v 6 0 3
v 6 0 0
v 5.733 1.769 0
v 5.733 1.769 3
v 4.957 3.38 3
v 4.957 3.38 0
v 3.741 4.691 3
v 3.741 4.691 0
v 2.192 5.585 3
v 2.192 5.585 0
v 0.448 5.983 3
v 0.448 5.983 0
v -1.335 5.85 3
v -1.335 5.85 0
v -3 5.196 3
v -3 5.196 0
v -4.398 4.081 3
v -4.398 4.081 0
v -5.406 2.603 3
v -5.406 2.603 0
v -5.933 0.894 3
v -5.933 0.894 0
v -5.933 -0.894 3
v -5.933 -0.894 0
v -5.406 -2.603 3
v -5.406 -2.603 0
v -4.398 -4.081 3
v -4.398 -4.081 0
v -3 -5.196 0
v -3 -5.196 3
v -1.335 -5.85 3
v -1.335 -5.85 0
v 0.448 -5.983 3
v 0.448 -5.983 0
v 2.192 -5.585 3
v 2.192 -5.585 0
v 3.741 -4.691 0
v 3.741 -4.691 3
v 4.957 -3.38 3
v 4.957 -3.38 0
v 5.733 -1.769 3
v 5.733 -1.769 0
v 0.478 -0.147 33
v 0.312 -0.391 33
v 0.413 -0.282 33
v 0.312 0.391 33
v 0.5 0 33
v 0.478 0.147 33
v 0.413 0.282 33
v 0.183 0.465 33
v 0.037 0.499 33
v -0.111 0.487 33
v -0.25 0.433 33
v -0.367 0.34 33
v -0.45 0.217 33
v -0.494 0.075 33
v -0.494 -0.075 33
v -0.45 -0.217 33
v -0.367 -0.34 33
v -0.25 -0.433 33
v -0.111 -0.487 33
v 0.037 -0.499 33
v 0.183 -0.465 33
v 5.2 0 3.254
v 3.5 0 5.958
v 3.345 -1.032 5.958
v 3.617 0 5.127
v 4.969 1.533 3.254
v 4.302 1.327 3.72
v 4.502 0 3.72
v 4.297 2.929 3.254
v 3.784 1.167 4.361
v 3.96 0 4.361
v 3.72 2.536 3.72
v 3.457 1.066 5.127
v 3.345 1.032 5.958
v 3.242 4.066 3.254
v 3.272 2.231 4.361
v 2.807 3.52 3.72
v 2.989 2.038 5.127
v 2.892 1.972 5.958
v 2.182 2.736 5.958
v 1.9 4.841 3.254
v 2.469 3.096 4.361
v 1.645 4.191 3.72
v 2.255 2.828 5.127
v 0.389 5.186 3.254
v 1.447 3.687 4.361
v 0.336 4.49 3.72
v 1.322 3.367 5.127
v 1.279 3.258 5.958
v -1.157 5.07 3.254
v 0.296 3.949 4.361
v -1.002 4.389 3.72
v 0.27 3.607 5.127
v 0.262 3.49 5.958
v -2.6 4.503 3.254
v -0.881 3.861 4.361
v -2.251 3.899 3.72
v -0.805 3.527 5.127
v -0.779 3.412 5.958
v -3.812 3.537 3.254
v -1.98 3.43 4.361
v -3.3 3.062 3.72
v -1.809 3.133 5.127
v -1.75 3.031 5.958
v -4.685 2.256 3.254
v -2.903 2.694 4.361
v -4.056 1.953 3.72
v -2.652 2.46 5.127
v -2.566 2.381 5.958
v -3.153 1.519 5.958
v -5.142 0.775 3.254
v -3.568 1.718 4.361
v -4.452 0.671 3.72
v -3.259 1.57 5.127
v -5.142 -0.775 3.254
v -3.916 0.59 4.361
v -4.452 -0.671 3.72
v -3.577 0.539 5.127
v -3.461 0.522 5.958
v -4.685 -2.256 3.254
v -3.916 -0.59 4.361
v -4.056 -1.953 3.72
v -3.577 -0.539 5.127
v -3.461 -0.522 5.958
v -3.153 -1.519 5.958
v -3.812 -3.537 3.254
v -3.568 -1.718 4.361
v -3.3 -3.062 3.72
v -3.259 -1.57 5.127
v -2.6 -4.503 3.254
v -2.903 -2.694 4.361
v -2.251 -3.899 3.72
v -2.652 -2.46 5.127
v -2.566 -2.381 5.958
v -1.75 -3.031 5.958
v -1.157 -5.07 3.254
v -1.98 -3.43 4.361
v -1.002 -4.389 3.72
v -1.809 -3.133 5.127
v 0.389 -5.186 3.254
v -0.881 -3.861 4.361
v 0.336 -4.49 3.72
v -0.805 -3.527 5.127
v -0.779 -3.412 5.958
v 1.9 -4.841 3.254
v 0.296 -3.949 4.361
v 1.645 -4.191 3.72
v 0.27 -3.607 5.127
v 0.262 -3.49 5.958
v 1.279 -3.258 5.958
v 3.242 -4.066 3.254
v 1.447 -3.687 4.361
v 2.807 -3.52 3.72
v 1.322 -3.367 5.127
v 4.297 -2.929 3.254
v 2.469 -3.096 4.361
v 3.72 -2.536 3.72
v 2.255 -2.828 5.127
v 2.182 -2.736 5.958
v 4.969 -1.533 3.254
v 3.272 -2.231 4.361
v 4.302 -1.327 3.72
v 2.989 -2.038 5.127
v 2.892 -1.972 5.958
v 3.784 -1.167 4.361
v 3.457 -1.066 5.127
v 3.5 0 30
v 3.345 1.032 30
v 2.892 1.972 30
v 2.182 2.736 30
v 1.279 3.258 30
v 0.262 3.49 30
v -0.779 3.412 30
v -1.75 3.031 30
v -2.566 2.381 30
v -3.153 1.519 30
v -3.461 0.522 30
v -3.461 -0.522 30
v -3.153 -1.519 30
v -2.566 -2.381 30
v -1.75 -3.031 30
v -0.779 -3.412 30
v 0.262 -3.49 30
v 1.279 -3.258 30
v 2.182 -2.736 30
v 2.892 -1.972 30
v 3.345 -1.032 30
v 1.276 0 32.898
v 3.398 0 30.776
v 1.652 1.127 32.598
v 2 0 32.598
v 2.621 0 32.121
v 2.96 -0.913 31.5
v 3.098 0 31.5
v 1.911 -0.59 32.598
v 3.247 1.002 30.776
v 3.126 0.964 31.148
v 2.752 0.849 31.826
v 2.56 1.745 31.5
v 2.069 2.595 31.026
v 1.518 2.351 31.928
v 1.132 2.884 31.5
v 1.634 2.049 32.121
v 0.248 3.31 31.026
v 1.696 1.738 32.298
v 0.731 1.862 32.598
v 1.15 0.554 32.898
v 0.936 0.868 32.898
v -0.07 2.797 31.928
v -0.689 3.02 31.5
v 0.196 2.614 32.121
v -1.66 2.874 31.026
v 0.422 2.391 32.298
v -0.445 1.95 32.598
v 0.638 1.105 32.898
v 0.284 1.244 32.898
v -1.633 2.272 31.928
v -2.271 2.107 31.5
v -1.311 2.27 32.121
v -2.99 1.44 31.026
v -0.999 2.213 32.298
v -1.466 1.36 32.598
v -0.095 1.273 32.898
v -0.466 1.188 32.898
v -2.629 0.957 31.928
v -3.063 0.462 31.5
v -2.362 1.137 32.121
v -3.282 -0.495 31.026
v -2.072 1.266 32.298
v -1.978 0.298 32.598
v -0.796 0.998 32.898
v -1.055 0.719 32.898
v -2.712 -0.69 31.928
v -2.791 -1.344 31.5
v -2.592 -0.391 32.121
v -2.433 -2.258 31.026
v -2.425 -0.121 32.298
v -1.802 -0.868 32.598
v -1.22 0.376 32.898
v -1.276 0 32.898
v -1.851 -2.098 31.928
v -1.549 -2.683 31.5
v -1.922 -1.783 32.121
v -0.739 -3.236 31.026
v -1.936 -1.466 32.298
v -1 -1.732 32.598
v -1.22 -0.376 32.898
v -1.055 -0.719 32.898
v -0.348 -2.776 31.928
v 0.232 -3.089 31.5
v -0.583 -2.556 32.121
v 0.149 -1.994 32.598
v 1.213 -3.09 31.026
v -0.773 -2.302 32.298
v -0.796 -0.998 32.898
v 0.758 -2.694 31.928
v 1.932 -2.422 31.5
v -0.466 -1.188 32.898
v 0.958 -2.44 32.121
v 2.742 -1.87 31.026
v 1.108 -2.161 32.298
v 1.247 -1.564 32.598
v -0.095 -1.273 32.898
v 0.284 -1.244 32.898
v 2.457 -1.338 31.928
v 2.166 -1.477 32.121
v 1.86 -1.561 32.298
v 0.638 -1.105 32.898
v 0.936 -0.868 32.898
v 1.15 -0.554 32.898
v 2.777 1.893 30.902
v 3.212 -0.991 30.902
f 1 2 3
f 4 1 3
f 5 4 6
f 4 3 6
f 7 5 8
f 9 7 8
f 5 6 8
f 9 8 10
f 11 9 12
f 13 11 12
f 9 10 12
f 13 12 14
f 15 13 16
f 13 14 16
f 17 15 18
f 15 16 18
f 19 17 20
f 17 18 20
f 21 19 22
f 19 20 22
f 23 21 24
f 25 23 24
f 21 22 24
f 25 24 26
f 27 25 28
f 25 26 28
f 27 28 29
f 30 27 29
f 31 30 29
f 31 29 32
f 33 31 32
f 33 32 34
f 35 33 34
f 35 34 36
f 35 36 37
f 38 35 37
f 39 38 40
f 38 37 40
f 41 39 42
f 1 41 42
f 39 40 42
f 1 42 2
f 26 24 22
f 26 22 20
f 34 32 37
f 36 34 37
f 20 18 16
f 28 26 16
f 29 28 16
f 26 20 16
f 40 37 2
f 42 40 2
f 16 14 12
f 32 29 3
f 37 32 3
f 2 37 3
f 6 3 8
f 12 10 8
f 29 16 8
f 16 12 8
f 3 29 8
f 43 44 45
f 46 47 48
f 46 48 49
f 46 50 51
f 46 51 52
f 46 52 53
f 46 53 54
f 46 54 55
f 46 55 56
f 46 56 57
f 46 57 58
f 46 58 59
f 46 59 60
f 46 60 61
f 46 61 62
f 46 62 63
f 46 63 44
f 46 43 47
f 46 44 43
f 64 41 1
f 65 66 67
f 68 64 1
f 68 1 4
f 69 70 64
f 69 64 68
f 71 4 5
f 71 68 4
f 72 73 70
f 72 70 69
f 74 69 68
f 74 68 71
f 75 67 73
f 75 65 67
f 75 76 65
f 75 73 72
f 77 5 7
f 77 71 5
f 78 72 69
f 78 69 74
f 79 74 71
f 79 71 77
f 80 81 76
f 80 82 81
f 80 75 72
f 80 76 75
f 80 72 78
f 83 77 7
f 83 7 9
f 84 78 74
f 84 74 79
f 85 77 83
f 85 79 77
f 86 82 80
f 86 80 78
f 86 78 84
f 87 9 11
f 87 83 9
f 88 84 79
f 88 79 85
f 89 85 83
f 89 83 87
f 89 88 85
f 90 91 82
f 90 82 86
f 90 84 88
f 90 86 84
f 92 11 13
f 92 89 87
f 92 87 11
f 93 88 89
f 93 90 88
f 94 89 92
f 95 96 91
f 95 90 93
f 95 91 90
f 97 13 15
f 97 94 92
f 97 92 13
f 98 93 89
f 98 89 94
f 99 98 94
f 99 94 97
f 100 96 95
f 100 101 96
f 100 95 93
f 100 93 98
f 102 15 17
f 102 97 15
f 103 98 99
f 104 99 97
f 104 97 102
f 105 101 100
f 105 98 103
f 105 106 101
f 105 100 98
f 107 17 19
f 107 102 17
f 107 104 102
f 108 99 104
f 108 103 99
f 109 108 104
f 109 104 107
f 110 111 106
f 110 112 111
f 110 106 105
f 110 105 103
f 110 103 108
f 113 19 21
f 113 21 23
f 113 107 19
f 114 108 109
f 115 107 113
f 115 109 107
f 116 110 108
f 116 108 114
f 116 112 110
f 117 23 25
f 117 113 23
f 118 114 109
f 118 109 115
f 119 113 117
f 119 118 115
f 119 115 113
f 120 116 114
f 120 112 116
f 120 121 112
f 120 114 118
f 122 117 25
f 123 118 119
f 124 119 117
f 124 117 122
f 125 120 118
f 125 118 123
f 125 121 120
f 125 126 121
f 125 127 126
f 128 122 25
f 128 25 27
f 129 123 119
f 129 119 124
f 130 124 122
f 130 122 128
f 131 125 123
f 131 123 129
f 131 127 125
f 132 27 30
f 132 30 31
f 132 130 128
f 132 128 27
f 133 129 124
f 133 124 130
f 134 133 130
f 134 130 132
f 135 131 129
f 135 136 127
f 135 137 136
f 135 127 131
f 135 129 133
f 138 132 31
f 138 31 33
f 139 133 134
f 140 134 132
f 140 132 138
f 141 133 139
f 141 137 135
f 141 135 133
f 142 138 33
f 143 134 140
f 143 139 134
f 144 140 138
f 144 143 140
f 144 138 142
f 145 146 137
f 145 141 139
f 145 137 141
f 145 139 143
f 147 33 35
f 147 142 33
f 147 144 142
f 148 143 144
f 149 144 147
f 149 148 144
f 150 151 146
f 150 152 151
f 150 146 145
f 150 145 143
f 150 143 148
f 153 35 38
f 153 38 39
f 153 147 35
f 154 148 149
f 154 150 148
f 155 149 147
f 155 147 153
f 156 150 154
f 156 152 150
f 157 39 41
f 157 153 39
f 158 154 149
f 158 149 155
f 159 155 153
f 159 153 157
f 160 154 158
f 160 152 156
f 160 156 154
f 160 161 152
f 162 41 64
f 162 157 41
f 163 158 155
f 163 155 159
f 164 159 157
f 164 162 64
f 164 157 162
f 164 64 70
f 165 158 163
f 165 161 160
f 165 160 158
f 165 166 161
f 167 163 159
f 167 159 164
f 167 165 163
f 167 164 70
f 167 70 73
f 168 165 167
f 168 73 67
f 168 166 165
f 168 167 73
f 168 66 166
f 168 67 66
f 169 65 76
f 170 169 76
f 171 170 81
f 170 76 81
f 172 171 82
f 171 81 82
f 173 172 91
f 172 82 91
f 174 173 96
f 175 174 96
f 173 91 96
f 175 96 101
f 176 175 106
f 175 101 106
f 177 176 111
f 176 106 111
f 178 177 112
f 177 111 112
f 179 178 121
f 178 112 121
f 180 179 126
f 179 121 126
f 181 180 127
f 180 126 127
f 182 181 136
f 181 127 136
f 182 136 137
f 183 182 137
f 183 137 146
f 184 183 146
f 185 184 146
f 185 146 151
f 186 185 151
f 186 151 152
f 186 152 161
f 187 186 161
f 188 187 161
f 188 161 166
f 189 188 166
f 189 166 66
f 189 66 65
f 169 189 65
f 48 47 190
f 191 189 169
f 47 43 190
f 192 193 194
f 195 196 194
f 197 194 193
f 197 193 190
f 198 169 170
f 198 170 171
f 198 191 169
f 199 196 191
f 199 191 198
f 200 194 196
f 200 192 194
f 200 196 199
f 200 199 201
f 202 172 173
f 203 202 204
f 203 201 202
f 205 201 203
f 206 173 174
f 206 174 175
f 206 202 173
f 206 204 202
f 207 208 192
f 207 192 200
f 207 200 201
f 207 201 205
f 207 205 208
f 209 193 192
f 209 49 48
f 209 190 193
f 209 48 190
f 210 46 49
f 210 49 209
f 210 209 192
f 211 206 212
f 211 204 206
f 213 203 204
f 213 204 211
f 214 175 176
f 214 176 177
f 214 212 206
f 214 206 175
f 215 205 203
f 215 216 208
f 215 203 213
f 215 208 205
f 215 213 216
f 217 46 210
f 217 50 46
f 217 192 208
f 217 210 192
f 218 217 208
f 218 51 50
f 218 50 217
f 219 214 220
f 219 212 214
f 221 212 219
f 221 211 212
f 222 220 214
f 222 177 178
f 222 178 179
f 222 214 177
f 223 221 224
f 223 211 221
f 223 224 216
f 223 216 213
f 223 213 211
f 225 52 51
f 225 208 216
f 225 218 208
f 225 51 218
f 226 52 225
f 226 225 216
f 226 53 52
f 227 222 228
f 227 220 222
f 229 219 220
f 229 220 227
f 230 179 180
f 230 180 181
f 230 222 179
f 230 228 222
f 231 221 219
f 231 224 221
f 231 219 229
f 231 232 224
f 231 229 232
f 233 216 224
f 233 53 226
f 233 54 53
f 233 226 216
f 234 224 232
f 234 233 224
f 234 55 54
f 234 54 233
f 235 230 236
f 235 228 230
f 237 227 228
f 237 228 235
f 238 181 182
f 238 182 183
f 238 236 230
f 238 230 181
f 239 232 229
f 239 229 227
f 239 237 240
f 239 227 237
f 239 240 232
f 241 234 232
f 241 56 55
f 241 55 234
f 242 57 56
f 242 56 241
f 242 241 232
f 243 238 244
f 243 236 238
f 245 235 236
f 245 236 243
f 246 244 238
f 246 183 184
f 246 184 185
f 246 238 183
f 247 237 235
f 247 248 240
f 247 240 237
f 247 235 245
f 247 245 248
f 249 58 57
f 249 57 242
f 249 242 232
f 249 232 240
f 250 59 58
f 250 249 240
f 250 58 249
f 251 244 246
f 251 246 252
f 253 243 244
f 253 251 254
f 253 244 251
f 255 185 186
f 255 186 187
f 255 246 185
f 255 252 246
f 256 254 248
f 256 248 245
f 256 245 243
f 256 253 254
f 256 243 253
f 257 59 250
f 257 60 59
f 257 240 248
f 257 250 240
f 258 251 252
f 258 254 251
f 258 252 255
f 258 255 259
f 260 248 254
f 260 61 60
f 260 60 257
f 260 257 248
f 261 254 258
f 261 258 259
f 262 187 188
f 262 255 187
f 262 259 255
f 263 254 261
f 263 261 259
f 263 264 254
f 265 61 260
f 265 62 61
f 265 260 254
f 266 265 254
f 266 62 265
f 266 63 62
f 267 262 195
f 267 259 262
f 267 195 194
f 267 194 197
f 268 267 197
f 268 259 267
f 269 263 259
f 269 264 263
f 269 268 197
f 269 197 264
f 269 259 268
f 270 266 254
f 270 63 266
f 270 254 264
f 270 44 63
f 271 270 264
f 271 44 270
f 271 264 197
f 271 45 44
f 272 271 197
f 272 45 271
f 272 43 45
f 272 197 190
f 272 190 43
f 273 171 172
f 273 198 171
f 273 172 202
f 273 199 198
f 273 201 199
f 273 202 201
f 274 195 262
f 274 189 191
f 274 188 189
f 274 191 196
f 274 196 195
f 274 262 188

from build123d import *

# Parameters (mm, degrees)
F0_R     = 6
F1_DEPTH = 3
F2_R     = 3.5
F3_DEPTH = 30


# Not quite as in the source:
# - a fillet or chamfer that OpenCascade refuses, or shapes differently, is made with other operations: its cross-section is extruded or revolved along the edge and cut away or added


with BuildPart() as f1:
    # F0 (on Top) → F1 (new body)
    with BuildSketch(Plane.XY):
        Circle(F0_R)
    extrude(amount=F1_DEPTH)

    # F2 (on face) → F3 (join)
    with BuildSketch(Plane.XY.offset(3)):
        Circle(F2_R)
    extrude(amount=F3_DEPTH)

    # F4: fillet of radius 3 on 2 edges, made by hand

    # F4_s1 → F4_t2 (revolve)
    with BuildSketch(Plane.XZ):
        with BuildLine():
            ThreePointArc((6, 3), (4.2087121525, 4.0215482184), (3.5, 5.9580398916))
            Line((3.5, 5.9580398916), (3.5, 3))
            Line((3.5, 3), (6, 3))
        make_face()
    revolve(axis=Axis((0, 0, 3), (0, 0, 1)))

    # F4_s3 → F4_t4 (revolve, cut)
    with BuildSketch(Plane.XZ):
        with BuildLine():
            ThreePointArc((3.5, 30), (2.6213203436, 32.1213203436), (0.5, 33))
            Line((0.5, 33), (3.5, 33))
            Line((3.5, 33), (3.5, 30))
        make_face()
    revolve(axis=Axis((0, 0, 33), (0, 0, 1)), mode=Mode.SUBTRACT)


solid = f1.part
